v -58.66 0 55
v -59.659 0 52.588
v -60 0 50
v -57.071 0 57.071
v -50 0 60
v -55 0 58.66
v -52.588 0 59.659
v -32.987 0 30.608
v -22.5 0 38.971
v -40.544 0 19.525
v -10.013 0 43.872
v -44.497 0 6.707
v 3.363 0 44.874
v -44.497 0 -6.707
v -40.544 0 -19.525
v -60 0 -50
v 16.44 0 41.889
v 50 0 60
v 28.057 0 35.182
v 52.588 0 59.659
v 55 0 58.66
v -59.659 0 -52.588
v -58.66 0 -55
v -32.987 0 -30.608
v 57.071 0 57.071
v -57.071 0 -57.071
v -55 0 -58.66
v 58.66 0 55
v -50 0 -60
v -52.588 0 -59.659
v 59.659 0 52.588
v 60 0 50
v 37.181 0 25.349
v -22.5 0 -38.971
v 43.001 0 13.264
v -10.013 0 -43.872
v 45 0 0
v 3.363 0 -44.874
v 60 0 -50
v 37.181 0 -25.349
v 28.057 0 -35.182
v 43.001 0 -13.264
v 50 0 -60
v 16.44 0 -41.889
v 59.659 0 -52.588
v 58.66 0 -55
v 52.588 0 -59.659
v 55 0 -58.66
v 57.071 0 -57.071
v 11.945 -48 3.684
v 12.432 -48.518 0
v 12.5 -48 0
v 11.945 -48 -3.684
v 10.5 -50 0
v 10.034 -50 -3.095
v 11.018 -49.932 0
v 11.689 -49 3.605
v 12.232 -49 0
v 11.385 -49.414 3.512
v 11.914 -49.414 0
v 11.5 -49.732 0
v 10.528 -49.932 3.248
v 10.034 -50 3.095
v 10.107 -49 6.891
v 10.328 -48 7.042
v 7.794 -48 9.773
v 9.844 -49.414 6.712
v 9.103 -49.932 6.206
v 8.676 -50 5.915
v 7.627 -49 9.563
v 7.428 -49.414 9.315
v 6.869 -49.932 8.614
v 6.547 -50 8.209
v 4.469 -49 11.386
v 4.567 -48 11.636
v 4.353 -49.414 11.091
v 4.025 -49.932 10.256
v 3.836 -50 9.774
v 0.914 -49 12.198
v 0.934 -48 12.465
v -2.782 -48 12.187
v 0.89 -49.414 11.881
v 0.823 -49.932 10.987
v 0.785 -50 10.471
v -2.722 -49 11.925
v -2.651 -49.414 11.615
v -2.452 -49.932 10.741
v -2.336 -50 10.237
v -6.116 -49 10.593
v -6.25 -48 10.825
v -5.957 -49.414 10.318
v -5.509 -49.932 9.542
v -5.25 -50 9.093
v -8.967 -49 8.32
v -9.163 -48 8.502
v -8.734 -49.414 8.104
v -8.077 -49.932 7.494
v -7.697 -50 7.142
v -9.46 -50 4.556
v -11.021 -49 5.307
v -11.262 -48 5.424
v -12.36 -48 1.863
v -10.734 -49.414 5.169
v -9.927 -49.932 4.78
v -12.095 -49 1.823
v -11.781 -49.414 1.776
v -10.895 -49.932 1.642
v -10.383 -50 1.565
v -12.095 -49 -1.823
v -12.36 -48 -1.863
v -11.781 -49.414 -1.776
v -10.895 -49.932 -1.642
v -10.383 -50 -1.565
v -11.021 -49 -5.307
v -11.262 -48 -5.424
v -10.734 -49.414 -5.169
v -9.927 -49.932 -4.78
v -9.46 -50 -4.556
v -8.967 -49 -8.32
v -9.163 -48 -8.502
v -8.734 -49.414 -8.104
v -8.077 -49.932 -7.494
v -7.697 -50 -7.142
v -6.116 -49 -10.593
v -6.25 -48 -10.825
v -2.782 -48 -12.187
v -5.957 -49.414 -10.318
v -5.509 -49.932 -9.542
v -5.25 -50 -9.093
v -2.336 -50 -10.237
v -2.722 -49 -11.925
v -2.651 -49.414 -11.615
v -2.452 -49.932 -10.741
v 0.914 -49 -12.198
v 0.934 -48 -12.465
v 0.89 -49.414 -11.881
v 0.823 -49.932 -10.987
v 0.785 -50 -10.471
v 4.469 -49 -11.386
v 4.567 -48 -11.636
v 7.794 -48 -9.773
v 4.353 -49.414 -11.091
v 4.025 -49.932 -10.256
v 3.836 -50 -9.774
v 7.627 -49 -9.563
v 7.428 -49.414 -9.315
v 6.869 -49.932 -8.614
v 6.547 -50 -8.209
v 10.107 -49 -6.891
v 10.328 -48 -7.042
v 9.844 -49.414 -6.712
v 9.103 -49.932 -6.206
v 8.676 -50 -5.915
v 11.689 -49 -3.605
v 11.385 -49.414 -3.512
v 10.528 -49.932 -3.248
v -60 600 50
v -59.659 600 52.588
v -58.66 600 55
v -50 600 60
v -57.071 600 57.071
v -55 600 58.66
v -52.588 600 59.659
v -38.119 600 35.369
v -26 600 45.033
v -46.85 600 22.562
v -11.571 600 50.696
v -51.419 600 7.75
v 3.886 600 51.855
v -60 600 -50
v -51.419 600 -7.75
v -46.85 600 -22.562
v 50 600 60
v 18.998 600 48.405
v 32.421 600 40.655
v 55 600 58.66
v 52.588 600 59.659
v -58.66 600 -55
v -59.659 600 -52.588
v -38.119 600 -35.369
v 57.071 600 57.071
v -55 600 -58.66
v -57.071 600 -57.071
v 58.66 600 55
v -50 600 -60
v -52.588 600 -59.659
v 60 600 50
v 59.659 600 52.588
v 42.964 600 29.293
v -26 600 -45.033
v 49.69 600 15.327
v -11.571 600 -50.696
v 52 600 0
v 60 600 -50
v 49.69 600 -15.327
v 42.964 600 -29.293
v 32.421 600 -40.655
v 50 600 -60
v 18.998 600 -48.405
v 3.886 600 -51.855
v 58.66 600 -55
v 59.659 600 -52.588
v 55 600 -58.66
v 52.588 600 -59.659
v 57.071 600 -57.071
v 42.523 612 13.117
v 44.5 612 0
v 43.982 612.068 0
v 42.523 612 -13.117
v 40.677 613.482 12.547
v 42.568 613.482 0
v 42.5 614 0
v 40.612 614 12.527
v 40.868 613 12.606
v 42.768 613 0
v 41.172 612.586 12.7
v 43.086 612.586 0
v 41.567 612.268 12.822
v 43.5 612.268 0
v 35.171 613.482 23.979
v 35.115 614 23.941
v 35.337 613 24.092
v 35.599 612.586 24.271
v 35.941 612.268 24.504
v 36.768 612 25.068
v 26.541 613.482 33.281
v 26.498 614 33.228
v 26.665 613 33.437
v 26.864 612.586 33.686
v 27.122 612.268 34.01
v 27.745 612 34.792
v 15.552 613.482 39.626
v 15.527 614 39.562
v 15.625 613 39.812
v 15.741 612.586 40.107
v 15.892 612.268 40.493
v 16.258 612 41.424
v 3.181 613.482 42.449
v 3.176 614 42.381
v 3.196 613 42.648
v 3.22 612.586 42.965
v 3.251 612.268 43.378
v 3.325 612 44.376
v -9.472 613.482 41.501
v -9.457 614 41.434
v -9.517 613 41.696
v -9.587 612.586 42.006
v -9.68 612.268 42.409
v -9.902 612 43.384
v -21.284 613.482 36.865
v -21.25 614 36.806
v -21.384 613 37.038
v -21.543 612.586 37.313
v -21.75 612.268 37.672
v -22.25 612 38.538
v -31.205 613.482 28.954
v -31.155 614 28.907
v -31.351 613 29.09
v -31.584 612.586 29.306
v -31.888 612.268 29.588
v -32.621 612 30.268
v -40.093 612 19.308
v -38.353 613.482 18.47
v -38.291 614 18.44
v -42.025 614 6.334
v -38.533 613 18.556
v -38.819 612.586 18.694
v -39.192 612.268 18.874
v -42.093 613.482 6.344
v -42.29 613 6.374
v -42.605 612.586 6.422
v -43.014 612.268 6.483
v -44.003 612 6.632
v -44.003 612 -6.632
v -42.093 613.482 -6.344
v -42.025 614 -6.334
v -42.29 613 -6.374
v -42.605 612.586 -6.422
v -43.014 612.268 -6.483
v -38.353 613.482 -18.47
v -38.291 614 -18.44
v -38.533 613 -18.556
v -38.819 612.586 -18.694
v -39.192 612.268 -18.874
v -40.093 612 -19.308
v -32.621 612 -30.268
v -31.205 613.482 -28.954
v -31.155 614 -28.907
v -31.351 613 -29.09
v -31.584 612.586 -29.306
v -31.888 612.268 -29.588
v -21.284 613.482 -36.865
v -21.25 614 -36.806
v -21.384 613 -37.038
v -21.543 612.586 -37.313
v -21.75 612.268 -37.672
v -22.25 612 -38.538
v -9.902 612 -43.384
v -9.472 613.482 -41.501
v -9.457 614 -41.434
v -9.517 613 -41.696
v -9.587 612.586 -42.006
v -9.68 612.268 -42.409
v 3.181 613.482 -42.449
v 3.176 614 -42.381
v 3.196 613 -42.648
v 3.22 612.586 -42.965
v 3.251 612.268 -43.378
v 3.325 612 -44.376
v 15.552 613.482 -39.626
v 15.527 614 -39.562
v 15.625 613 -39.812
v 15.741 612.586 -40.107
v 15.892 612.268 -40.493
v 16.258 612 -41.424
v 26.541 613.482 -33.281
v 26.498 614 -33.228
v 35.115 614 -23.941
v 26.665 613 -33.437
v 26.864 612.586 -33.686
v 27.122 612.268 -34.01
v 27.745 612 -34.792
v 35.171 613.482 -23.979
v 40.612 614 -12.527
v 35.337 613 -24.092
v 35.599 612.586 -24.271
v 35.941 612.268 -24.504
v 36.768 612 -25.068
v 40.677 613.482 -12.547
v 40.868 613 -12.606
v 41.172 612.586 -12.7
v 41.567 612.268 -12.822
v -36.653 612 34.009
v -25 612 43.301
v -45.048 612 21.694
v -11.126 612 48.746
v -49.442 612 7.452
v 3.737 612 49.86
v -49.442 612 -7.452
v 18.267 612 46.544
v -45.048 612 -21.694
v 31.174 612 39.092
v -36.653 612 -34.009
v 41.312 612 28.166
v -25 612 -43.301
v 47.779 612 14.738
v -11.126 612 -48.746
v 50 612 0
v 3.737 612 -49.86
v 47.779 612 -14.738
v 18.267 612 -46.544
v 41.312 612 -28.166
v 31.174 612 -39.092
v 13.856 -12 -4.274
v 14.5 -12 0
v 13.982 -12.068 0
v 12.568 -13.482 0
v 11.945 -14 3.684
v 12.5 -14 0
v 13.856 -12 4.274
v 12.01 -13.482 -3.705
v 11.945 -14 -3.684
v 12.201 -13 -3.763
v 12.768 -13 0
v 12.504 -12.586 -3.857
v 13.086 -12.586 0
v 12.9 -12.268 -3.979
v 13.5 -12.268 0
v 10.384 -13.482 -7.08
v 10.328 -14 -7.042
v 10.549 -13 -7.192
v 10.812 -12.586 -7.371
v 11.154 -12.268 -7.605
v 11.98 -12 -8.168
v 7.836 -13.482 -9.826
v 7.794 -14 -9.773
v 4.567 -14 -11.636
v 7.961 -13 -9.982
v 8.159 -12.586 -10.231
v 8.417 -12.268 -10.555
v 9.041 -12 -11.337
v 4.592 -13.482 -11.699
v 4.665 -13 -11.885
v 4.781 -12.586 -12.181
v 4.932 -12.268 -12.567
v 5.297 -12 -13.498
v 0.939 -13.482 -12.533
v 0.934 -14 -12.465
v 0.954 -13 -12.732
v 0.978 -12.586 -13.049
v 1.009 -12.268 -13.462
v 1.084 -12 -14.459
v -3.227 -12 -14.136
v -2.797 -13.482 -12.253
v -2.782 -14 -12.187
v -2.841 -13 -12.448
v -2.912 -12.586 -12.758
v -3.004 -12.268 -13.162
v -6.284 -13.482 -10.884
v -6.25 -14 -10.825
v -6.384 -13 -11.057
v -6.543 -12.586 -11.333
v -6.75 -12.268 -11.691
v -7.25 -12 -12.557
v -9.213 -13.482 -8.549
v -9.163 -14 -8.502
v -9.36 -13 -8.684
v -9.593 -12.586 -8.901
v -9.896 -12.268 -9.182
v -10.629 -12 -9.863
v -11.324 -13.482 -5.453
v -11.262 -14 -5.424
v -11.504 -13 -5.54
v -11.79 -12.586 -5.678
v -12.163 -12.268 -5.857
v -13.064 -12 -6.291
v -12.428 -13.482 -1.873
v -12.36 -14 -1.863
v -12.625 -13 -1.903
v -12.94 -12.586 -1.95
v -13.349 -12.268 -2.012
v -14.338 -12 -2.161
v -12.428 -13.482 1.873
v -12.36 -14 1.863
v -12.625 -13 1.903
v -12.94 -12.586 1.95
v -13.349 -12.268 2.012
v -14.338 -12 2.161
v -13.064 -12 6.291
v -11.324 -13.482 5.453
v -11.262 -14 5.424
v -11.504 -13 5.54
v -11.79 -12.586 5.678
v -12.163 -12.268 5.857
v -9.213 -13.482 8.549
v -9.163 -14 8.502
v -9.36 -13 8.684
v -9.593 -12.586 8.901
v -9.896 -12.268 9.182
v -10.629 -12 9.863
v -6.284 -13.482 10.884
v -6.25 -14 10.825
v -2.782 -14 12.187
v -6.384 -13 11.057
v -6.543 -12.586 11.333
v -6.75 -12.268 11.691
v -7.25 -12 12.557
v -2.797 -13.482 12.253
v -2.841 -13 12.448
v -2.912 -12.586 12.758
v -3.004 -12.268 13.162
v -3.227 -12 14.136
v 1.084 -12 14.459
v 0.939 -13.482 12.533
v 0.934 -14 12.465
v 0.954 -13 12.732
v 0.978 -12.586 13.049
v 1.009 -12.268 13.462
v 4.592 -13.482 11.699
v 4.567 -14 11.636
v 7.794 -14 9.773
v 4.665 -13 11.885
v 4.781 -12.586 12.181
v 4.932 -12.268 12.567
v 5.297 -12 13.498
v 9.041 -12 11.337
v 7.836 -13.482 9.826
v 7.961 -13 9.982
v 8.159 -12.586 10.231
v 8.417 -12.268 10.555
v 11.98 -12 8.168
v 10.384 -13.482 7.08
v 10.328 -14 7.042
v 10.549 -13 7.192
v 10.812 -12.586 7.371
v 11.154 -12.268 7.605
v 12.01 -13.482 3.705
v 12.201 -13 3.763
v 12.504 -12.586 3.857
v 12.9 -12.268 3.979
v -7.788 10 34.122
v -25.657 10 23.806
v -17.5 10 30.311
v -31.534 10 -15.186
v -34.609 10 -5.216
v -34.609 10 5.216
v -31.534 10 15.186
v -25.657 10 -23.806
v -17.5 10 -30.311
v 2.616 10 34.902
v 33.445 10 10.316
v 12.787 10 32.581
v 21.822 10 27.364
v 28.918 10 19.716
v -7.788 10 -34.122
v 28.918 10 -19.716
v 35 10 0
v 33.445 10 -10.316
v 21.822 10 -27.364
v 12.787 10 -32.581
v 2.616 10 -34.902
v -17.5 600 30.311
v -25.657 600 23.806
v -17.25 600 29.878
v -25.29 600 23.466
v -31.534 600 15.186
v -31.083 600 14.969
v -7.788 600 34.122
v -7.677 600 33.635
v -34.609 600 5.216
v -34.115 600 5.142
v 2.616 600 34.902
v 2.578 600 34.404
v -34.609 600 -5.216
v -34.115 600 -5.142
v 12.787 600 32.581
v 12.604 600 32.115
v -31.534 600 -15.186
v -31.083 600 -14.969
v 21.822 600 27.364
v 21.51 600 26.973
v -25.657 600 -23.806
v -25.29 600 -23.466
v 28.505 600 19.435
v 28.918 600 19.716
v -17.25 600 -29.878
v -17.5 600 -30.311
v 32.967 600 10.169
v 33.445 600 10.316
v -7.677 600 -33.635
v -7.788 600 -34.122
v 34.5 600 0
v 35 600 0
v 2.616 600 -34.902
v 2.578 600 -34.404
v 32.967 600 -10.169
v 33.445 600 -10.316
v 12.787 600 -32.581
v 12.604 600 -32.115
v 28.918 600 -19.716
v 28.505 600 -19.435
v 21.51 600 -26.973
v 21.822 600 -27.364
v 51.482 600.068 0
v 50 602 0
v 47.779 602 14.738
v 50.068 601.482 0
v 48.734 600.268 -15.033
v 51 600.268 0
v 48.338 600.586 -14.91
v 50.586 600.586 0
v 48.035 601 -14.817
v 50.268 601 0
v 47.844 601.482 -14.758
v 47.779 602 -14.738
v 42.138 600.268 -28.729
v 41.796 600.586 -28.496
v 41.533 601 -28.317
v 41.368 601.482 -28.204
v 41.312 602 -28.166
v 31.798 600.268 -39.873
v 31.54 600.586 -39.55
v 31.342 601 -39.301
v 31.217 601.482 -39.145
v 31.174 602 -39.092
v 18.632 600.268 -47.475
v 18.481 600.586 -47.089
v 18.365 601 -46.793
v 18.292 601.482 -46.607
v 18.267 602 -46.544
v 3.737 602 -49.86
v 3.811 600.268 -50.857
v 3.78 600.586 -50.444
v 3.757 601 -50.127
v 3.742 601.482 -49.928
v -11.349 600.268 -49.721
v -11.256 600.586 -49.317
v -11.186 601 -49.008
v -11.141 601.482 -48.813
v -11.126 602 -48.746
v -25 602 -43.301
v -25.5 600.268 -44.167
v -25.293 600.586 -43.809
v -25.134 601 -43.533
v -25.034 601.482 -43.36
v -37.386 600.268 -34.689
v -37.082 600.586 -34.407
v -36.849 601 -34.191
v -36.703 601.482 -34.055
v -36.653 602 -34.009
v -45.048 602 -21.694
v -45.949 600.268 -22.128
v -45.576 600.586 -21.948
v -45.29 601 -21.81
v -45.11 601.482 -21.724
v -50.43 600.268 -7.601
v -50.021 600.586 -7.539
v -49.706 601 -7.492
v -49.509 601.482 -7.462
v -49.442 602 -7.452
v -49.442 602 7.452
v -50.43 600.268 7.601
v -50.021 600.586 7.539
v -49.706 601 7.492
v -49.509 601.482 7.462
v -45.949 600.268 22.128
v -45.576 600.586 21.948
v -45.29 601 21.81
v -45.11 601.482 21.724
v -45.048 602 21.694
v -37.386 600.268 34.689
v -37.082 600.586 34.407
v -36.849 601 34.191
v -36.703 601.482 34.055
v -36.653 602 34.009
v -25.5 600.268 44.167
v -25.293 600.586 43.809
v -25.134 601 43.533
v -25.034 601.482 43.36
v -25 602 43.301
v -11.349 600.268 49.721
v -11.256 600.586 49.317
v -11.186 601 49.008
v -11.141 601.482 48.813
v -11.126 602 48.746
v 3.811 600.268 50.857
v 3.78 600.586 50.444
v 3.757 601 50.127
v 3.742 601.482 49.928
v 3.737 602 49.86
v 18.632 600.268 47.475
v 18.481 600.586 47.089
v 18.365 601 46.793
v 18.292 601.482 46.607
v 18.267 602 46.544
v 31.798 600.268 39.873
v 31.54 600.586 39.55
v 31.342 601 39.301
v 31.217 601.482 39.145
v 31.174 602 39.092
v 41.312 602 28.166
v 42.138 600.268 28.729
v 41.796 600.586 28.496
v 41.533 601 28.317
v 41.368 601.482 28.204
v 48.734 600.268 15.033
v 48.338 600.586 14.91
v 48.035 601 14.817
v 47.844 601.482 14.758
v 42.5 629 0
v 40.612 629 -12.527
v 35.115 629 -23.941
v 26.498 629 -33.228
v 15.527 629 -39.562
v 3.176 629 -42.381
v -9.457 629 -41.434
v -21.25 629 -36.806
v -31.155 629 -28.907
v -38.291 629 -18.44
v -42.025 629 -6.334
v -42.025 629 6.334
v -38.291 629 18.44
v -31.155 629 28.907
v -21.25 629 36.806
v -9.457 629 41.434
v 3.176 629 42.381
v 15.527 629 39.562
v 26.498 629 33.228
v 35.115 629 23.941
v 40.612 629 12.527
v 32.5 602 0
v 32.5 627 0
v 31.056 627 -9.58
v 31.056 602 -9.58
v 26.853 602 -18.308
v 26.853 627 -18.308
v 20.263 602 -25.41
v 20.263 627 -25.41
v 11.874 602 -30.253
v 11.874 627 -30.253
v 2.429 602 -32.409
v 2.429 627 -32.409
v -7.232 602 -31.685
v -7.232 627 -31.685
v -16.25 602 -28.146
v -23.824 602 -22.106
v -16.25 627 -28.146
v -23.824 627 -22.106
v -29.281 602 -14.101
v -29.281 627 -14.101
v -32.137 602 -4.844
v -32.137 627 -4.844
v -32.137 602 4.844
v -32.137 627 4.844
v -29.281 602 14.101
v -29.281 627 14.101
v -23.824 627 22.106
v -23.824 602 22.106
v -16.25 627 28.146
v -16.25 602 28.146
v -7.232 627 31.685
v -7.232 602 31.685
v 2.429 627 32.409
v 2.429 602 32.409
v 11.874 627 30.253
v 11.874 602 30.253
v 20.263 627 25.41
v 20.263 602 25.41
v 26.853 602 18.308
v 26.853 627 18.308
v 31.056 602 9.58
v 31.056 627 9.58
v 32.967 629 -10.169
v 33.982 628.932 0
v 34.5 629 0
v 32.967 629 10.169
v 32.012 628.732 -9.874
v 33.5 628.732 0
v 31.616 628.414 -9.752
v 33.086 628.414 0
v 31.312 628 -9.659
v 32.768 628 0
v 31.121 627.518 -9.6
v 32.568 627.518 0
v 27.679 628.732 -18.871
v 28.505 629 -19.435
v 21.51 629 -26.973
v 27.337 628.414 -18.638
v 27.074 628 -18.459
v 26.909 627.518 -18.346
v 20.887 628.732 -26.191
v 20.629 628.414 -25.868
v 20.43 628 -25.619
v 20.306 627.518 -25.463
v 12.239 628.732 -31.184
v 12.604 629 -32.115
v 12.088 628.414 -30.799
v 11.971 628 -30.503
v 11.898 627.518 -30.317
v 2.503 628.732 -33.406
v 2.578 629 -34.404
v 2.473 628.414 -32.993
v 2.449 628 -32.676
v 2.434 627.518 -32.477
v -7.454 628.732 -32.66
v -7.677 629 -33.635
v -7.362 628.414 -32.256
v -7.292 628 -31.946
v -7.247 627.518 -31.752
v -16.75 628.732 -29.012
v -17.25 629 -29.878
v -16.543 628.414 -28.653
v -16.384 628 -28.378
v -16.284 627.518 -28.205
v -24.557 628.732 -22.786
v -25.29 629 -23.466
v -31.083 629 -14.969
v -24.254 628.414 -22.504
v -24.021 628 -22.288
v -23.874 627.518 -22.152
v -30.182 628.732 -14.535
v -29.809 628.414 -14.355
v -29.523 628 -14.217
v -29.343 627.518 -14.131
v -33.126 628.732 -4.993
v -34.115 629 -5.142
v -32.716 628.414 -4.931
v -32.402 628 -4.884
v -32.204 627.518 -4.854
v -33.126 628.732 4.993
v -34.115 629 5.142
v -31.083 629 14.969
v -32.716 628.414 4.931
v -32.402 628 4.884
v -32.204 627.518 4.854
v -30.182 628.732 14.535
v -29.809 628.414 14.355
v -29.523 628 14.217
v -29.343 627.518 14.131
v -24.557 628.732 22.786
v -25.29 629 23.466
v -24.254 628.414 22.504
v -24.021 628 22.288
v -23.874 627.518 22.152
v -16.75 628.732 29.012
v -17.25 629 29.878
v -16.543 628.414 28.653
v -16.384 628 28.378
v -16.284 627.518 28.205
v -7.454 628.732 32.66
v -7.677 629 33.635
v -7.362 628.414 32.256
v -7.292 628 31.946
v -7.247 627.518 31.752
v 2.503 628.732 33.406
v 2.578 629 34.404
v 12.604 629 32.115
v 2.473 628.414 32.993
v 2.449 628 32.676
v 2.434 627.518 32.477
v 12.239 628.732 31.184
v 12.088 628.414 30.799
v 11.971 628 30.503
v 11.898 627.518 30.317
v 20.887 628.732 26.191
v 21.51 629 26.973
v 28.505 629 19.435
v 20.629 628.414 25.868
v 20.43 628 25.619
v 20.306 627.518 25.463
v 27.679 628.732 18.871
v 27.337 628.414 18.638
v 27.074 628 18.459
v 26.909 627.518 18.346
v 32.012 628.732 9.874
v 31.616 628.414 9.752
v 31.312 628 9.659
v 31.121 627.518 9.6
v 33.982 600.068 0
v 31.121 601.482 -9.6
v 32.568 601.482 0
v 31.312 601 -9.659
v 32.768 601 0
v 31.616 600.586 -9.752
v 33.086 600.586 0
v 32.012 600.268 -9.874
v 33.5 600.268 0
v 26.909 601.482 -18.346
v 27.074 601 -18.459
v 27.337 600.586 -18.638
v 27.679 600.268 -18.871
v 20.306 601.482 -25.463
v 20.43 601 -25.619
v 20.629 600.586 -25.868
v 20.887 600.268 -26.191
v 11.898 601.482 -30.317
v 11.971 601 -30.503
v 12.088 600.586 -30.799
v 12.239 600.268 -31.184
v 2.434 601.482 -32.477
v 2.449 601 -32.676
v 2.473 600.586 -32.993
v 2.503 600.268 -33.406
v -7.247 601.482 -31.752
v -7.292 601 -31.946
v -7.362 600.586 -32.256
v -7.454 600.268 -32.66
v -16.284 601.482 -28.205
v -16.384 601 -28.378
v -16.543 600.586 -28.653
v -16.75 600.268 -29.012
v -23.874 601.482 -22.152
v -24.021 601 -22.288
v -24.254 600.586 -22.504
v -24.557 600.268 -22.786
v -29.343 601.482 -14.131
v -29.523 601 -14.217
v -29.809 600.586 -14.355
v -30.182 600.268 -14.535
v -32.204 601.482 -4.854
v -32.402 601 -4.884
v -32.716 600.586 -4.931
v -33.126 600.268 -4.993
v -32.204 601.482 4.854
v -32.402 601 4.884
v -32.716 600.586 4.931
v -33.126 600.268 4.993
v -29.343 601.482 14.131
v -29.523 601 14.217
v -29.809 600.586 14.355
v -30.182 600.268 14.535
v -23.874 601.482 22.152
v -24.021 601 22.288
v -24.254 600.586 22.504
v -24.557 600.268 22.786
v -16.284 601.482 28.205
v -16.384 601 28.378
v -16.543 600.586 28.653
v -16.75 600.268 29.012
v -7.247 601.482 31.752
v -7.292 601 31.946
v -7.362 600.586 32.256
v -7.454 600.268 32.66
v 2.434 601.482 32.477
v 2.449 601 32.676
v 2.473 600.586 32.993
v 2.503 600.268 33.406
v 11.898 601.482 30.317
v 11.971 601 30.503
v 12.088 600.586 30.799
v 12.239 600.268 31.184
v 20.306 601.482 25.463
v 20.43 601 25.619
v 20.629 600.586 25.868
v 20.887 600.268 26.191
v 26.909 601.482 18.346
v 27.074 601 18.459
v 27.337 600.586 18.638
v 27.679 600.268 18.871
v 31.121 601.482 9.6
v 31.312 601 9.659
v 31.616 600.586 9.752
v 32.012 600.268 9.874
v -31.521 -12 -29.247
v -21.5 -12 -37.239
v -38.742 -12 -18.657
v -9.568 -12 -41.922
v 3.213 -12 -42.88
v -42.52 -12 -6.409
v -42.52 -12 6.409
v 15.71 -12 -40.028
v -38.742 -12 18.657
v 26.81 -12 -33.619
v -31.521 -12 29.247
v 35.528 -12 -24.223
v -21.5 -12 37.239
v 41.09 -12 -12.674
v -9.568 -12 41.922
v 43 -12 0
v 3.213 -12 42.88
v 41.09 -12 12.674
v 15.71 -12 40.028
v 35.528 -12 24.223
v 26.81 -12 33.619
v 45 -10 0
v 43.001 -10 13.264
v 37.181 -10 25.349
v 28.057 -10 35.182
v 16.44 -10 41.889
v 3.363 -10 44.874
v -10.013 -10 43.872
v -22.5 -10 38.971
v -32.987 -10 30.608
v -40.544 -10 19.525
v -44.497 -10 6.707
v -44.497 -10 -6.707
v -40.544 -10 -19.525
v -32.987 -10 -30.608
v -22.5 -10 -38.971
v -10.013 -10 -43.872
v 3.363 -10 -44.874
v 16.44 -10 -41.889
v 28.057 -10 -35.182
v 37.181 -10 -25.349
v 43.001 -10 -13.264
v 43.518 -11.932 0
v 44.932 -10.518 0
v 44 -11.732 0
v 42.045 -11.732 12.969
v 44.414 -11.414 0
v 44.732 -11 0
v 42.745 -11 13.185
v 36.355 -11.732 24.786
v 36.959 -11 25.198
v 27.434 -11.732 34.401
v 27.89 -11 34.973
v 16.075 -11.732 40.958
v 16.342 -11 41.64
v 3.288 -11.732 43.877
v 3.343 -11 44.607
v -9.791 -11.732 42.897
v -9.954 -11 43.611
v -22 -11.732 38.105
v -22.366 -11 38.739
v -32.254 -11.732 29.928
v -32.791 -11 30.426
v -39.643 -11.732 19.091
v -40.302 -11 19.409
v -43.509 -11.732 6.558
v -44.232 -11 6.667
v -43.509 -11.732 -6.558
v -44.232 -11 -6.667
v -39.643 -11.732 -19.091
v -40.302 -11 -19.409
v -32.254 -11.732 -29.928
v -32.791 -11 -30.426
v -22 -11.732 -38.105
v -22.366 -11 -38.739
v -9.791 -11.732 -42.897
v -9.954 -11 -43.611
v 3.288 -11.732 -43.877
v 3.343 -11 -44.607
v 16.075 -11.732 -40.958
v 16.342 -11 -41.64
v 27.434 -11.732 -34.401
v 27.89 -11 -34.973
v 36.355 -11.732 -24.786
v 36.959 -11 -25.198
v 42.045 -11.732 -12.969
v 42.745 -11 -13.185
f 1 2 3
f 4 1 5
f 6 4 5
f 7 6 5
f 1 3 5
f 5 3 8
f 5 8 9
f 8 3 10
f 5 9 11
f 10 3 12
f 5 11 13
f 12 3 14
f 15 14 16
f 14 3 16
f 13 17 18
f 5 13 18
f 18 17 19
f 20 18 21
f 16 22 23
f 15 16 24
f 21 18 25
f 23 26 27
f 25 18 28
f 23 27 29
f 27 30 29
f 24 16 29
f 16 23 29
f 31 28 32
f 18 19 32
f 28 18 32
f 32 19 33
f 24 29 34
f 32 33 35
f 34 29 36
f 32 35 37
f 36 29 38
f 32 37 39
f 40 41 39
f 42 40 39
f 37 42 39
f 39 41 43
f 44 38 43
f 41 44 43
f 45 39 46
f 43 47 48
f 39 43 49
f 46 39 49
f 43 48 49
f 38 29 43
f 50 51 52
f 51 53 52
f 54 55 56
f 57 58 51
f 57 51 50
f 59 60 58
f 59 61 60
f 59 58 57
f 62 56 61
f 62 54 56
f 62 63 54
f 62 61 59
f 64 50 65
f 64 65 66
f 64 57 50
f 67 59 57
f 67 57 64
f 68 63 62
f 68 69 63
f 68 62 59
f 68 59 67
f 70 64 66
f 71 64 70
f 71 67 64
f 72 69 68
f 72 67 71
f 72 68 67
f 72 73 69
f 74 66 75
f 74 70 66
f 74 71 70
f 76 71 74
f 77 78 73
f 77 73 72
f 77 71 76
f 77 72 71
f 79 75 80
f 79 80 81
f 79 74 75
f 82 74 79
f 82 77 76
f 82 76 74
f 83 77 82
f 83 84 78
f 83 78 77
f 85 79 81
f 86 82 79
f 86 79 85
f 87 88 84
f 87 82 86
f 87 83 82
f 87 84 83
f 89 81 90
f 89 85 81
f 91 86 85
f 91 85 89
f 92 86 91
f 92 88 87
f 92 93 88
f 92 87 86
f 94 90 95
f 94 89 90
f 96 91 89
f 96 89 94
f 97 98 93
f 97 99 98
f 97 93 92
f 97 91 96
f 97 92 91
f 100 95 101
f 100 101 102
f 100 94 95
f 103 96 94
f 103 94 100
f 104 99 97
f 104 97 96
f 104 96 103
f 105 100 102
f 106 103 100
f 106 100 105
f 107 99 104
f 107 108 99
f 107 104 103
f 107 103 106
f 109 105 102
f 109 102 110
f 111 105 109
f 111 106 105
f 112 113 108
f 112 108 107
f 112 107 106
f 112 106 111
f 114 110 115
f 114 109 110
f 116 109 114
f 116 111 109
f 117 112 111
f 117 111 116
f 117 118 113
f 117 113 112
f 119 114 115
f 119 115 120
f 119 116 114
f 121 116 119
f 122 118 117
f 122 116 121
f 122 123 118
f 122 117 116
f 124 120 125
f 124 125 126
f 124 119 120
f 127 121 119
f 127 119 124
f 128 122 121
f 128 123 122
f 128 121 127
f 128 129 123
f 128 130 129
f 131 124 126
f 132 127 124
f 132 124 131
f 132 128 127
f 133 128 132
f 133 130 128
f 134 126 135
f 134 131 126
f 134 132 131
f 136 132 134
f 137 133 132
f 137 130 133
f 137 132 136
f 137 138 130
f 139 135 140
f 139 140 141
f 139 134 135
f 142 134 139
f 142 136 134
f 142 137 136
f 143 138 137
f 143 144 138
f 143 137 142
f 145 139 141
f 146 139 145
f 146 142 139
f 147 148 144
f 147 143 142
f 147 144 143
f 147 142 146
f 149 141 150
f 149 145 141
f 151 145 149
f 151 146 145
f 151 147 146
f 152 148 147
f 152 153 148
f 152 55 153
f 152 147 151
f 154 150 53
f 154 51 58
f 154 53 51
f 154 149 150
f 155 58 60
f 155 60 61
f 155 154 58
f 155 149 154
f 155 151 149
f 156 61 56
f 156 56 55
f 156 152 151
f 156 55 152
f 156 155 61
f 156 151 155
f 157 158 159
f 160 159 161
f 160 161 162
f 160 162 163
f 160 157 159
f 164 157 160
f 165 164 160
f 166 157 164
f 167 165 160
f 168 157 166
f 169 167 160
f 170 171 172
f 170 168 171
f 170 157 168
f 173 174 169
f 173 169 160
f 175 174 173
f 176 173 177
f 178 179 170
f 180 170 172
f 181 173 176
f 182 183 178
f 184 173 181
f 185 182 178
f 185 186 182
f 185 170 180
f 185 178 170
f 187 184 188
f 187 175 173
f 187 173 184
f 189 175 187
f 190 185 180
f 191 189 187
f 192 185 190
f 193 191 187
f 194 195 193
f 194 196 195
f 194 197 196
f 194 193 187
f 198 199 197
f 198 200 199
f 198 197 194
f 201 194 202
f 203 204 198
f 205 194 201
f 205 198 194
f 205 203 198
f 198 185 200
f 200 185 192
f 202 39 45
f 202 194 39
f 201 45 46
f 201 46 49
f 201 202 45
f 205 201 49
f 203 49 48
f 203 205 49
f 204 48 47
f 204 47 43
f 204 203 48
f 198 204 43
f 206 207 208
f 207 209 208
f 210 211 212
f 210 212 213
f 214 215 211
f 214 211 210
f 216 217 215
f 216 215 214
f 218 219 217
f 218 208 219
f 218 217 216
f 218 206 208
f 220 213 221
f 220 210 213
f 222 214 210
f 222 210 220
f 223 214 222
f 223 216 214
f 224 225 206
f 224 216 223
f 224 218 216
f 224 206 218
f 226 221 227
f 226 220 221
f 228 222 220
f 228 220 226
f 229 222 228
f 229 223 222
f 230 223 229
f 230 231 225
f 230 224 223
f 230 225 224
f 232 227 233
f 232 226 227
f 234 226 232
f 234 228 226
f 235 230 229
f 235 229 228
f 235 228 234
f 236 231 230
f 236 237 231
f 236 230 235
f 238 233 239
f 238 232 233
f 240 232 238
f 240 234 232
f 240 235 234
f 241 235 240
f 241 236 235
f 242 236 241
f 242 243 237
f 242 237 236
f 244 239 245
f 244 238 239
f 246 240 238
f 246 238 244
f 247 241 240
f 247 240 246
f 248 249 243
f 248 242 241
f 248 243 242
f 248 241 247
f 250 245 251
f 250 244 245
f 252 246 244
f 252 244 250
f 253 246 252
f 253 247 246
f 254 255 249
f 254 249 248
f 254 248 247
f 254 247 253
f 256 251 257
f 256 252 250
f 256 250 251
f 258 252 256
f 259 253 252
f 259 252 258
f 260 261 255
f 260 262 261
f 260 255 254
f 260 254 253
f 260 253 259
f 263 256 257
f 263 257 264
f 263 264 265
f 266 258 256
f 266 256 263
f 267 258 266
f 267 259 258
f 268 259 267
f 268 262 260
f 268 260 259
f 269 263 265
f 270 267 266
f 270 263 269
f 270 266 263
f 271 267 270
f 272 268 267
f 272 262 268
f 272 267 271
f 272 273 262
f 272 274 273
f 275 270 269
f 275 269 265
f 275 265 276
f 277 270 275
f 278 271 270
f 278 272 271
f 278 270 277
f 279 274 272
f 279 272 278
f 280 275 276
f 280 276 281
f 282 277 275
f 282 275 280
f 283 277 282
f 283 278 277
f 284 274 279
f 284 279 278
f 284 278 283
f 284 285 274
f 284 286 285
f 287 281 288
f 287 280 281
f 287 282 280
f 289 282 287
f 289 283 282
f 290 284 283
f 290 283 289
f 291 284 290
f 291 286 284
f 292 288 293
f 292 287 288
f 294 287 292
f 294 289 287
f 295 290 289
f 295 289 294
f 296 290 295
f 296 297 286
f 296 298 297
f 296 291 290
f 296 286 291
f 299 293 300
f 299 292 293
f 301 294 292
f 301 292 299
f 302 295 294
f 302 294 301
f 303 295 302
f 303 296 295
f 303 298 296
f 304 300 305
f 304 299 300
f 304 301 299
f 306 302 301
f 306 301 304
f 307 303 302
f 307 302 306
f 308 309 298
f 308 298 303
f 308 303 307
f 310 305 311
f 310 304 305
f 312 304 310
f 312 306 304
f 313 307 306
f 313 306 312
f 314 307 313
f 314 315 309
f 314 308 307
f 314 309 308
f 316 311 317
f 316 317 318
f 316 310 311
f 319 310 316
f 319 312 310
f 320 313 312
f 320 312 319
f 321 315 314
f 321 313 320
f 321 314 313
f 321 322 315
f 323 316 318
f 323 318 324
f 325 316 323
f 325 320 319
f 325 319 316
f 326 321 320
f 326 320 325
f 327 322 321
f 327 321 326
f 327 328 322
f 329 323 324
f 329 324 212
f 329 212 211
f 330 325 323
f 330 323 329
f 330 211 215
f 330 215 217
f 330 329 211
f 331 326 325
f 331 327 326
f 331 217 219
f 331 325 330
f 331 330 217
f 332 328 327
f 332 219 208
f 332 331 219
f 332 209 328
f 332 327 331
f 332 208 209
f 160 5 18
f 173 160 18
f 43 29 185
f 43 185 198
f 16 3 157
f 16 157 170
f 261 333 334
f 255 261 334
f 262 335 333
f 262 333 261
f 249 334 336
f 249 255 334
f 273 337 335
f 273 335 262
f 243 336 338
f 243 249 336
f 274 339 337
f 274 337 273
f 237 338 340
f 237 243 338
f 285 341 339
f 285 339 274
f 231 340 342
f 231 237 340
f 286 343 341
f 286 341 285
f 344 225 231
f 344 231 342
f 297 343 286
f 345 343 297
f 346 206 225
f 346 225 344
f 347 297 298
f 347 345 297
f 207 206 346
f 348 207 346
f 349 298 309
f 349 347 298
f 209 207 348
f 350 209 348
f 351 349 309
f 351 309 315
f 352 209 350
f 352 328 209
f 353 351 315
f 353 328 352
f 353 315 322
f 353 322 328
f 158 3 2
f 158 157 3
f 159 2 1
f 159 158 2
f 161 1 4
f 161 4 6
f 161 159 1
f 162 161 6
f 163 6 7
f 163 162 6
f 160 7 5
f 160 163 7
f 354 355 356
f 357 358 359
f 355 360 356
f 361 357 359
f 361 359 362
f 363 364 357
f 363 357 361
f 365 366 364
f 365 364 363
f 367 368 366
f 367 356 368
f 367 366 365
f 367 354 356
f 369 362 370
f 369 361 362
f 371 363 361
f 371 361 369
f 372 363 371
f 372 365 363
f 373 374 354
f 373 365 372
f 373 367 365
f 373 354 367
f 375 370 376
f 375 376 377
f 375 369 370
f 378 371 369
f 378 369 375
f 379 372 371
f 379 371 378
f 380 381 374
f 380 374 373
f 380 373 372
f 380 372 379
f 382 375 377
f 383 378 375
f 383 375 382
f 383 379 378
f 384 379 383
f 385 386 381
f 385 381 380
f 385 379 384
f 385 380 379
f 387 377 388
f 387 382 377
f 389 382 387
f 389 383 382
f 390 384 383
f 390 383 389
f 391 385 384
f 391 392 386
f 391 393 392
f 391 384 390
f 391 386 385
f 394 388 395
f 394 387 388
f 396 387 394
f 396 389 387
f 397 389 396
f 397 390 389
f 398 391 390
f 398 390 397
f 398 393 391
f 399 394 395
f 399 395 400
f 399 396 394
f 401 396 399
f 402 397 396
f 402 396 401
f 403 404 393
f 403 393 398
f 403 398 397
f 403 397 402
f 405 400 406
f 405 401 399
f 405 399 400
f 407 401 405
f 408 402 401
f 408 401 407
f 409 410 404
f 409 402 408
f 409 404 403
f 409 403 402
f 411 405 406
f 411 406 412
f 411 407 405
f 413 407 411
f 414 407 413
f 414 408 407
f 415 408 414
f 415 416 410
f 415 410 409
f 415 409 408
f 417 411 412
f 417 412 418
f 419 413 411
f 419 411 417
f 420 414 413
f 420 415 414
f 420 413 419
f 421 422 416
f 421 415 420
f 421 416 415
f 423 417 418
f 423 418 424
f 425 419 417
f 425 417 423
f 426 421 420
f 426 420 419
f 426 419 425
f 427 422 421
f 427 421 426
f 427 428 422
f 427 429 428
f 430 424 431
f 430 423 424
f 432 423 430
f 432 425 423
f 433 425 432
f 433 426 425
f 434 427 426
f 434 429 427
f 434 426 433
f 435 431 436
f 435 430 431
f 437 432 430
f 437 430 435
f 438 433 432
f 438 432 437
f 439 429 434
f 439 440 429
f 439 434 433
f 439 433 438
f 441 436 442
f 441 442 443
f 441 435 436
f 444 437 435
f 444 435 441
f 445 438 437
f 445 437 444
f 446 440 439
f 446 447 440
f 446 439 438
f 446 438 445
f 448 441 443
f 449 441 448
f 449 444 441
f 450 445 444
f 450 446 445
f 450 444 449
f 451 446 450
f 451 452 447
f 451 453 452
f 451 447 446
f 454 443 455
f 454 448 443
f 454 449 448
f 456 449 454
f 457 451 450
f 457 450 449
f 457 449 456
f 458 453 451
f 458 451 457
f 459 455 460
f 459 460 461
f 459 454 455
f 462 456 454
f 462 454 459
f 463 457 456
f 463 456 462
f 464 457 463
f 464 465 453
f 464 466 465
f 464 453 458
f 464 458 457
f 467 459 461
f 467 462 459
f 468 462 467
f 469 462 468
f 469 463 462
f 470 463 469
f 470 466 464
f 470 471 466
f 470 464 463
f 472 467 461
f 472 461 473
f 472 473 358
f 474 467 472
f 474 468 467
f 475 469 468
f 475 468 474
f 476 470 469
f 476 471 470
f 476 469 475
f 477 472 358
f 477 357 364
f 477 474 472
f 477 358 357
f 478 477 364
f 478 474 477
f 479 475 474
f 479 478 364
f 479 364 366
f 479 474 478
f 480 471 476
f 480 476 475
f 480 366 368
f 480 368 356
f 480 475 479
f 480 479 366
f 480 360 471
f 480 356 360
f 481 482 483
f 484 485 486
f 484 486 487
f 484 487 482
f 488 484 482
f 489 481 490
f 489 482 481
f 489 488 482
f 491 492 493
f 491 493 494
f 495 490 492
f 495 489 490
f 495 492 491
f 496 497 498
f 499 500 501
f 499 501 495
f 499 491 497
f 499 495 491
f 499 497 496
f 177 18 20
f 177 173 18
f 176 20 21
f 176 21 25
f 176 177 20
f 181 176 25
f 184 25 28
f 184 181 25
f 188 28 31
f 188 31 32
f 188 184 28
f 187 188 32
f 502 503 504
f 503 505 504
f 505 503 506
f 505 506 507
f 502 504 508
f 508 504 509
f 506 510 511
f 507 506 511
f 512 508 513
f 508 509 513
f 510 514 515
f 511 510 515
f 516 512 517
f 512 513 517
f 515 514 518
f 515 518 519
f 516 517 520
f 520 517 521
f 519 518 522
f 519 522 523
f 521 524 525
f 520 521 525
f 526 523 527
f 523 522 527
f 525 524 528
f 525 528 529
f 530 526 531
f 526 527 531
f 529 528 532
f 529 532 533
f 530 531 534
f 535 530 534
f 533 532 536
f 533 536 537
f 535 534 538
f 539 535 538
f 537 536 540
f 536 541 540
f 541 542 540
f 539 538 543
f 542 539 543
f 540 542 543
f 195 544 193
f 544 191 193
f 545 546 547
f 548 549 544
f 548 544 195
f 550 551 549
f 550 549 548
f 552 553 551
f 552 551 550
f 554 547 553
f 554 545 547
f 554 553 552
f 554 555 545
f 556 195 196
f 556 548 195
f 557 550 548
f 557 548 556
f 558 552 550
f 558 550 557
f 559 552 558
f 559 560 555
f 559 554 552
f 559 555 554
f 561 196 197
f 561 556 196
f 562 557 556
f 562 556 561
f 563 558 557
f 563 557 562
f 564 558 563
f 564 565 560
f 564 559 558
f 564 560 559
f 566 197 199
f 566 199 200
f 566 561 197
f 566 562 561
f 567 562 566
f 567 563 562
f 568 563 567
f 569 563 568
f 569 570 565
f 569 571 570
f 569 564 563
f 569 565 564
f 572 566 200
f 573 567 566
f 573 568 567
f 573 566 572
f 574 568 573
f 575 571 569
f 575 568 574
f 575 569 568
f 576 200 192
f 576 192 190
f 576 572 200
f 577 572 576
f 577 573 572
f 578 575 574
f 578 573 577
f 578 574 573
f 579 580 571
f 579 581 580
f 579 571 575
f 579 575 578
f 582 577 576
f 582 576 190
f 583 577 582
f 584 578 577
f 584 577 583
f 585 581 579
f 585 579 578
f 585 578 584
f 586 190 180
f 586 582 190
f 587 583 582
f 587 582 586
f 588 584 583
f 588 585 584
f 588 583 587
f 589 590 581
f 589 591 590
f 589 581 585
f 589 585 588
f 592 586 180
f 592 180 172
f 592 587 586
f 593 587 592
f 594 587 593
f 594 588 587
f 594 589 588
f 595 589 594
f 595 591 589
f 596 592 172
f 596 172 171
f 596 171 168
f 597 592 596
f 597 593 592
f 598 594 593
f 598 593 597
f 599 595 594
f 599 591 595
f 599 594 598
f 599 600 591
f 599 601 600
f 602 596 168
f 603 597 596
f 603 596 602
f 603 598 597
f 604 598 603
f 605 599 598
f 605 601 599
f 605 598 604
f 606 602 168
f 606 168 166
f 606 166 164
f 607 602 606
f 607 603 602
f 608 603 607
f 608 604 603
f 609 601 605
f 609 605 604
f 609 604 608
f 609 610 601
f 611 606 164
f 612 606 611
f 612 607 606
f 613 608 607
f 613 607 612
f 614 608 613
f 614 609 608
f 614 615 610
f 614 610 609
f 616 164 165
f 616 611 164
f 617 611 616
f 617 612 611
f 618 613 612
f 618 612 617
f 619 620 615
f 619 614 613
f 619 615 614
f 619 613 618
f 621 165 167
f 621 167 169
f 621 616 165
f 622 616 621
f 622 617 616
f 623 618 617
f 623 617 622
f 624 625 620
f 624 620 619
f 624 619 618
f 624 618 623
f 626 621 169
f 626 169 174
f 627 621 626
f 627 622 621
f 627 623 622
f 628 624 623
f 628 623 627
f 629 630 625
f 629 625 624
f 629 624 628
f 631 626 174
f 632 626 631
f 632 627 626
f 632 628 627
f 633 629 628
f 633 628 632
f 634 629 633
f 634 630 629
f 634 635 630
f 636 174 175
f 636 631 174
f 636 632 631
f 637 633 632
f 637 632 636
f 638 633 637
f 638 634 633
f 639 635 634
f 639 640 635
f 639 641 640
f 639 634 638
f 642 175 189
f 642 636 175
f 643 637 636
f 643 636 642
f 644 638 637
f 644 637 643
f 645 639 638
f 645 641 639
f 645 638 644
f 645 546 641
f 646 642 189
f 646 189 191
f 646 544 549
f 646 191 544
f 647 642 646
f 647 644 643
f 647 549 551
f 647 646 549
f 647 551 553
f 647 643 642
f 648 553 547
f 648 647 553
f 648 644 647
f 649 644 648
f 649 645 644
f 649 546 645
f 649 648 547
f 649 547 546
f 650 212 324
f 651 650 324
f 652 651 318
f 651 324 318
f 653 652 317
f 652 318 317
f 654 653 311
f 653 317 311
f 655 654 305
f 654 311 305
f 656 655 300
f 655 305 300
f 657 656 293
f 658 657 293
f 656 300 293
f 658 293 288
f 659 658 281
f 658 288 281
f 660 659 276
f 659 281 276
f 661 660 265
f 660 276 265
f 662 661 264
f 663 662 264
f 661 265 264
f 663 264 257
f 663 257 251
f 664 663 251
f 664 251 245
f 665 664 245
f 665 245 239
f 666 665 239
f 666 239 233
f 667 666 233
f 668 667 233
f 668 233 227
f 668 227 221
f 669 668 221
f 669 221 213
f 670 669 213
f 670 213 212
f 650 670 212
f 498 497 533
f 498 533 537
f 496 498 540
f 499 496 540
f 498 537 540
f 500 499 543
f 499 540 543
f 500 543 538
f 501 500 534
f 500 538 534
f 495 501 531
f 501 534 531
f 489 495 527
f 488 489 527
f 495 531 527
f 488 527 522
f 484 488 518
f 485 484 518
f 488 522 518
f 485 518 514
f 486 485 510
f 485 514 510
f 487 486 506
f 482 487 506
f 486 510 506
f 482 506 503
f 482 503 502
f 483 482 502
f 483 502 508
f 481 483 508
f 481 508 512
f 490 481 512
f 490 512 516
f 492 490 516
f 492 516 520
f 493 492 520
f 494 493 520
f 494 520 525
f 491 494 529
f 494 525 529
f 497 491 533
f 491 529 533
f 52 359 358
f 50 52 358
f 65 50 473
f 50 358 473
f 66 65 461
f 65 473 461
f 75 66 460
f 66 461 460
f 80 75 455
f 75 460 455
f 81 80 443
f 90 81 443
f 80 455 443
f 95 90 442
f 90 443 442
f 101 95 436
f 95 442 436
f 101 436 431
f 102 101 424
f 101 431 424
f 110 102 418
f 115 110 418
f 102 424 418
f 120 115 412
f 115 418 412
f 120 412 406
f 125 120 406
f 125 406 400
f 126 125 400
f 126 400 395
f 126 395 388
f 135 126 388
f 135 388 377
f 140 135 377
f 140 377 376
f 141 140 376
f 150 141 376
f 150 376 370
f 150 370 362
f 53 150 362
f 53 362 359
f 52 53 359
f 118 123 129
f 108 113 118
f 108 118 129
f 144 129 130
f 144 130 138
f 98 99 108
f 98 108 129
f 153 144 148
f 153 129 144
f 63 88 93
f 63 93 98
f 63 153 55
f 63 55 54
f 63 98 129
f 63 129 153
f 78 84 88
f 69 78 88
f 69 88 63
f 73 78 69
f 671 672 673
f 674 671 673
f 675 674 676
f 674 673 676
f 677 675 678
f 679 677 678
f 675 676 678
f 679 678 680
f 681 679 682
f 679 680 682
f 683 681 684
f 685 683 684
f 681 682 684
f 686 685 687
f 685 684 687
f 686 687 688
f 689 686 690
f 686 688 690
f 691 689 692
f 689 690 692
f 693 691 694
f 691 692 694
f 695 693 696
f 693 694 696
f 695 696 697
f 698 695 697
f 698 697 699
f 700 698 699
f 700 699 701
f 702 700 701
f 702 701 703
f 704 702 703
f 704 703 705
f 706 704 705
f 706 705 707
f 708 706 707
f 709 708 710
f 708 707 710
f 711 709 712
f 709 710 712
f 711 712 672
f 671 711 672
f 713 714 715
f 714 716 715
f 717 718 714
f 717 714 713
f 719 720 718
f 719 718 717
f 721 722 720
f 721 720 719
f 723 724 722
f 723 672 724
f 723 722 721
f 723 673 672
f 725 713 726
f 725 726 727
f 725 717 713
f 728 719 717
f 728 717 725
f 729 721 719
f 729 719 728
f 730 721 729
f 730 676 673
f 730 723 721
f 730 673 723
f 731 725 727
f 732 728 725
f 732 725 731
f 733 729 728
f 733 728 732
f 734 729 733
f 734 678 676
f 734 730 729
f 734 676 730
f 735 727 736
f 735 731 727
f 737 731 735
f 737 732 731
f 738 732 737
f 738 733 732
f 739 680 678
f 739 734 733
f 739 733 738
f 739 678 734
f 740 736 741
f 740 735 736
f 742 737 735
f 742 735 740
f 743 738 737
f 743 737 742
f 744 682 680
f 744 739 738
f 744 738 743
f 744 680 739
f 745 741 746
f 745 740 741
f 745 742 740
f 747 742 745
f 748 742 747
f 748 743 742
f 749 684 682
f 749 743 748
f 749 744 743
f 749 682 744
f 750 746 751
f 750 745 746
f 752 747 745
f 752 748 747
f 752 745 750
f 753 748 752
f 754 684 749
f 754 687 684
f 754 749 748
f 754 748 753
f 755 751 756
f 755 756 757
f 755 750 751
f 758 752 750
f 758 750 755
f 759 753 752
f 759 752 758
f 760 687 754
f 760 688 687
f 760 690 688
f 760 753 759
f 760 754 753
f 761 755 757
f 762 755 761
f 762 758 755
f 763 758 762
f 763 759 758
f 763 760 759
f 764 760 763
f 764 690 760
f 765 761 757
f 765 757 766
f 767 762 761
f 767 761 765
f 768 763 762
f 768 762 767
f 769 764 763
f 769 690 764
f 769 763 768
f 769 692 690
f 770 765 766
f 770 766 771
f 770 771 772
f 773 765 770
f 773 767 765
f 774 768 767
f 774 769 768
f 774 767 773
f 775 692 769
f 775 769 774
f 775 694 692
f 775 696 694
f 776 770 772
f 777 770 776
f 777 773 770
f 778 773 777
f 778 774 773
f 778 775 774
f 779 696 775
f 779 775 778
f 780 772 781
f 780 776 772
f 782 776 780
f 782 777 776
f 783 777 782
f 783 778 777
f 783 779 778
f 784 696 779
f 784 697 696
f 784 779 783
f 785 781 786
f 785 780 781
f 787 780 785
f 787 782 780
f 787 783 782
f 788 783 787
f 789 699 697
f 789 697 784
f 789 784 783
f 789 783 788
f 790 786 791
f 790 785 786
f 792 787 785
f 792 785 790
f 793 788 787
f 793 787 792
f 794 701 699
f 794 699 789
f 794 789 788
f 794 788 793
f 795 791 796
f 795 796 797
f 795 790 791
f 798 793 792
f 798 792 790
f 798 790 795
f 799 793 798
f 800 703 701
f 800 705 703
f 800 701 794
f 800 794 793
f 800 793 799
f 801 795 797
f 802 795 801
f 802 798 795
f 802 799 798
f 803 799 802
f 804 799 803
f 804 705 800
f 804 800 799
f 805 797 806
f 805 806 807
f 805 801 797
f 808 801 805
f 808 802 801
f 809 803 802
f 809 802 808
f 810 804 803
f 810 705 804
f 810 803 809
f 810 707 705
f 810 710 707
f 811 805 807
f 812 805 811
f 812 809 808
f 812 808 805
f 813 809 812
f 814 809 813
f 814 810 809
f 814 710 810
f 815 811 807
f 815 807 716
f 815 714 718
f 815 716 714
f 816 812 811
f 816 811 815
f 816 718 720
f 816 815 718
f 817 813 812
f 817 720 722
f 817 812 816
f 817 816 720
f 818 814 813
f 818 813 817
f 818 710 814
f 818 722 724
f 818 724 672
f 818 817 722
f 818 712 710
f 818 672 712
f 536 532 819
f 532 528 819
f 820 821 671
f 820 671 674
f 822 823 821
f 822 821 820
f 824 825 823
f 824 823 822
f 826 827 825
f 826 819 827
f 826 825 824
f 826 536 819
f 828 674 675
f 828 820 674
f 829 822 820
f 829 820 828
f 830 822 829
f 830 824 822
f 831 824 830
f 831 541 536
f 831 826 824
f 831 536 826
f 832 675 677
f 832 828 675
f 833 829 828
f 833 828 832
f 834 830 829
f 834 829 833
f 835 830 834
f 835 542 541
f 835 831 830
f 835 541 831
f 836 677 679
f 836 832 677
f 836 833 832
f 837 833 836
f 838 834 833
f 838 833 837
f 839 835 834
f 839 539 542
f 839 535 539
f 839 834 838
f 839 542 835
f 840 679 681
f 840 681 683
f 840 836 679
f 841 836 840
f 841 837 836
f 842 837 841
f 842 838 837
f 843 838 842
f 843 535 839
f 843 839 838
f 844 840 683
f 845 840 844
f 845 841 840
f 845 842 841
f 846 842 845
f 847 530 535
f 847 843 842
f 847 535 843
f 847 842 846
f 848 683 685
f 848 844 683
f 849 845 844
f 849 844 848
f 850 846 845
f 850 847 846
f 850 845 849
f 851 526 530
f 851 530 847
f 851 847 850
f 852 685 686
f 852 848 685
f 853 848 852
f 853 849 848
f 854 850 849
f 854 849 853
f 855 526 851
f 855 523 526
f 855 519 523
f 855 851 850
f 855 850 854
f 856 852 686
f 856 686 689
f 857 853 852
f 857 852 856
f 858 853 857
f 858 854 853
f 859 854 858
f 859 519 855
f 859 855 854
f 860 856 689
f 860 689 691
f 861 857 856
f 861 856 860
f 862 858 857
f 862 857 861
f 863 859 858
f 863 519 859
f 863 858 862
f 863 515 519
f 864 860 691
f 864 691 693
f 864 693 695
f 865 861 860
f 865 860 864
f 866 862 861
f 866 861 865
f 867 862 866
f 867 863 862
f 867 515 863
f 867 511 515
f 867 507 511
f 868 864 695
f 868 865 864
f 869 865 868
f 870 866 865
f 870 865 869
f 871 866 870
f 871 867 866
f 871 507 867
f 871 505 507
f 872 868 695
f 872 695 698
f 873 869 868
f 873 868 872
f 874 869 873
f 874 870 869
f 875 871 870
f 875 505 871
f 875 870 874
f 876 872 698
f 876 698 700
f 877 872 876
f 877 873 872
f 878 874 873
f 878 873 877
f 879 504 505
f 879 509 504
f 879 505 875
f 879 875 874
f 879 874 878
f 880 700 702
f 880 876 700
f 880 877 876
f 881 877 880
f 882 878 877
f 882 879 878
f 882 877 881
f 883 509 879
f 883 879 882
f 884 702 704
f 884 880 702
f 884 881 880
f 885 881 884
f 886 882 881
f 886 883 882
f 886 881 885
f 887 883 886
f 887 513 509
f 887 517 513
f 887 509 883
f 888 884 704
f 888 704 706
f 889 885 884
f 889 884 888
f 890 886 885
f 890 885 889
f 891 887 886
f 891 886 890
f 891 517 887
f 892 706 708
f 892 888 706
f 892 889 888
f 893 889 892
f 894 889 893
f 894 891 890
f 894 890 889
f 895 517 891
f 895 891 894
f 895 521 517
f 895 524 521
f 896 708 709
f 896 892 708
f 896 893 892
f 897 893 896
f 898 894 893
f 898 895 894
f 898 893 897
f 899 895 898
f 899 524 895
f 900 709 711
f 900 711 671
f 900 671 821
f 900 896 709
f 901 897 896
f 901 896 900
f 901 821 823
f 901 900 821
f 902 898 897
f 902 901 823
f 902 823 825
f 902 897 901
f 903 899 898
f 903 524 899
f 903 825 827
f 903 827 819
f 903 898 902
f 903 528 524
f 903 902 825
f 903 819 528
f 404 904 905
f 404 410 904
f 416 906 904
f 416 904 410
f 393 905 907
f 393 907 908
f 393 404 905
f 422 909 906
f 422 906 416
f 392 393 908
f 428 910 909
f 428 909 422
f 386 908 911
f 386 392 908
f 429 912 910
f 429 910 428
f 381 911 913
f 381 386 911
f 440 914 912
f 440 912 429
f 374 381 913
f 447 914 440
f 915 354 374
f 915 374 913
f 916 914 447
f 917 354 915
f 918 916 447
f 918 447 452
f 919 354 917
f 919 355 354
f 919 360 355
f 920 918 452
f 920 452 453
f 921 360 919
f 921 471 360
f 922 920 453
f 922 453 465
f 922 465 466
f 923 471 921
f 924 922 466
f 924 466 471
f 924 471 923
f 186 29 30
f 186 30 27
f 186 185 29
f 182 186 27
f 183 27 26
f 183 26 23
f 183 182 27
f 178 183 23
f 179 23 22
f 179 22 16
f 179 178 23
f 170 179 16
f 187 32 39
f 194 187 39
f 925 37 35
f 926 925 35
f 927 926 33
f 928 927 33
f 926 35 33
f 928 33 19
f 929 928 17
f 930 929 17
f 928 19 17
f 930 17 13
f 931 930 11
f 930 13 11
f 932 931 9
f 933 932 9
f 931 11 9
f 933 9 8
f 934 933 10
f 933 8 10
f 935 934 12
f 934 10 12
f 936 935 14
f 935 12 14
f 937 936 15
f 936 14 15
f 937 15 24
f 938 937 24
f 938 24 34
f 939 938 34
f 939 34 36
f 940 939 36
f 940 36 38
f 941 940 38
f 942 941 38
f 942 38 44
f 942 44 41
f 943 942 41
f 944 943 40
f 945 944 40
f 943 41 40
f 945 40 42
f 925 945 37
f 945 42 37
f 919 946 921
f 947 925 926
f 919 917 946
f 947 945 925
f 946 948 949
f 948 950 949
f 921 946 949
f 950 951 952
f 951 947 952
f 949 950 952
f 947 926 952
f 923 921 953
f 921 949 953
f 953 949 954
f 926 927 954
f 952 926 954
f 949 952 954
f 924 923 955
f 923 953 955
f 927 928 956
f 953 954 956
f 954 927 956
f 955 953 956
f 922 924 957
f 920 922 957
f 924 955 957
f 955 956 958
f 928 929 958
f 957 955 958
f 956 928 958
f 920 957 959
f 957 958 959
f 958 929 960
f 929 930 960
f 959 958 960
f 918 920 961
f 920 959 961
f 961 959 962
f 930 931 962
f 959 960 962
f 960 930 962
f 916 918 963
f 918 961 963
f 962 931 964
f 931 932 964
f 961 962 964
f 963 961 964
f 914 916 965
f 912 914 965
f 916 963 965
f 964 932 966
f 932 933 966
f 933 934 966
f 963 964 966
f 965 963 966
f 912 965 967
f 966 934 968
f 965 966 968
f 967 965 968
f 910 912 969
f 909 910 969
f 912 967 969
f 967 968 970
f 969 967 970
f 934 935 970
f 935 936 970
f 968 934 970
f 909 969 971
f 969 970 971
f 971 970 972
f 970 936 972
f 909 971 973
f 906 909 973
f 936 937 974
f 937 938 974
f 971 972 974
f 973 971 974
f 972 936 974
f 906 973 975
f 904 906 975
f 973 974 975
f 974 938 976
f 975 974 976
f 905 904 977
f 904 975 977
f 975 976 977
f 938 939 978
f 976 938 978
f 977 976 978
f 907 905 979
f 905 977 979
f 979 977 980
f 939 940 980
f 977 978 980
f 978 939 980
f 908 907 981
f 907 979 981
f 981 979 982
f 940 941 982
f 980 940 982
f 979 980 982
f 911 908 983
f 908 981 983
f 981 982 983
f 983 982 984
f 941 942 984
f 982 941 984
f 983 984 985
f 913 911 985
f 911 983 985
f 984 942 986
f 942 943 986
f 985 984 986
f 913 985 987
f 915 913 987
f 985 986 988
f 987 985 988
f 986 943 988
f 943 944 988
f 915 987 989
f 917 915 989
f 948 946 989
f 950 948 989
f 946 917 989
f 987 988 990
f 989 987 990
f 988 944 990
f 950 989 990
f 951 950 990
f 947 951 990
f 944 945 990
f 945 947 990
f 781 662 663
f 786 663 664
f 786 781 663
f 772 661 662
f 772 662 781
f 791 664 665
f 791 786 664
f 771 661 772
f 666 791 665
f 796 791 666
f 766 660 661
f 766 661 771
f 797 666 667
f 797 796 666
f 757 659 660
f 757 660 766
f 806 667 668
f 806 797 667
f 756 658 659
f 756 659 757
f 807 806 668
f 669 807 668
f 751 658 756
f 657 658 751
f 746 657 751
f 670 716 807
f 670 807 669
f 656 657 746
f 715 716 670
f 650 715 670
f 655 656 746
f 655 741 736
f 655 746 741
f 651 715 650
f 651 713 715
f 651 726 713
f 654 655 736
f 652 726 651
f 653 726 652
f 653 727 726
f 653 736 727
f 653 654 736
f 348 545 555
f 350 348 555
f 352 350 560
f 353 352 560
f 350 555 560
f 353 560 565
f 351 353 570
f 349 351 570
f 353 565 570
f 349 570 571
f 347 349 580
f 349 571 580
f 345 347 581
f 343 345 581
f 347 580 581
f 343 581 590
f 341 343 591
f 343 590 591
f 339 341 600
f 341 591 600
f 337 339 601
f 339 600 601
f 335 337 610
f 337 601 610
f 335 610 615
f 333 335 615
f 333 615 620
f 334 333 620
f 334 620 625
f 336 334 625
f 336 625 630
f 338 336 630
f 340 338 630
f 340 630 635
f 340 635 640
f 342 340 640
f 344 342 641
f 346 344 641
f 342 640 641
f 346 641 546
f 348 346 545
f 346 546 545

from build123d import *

# Parameters (mm, degrees)
ESQUISSE1_W             = 120
ESQUISSE1_H             = 120
BOSS_EXTRU_1_DEPTH      = 600
CONG_1_R                = 10
CONG_2_R                = 10
CONG_3_R                = 10
CONG_4_R                = 10
ESQUISSE2_R             = 42.5
BOSS_EXTRU_2_DEPTH      = 29
ESQUISSE4_R             = 50
BOSS_EXTRU_3_DEPTH      = 12
ESQUISSE8_R             = 45
BOSS_EXTRU_4_DEPTH      = 12
ESQUISSE9_R             = 12.5
BOSS_EXTRU_5_DEPTH      = 50
ESQUISSE5_R             = 35
ENL_V_MAT_EXTRU_1_DEPTH = 590
CONG_5_R                = 2
CONG_6_R                = 2
CONG_7_R                = 2
ESQUISSE11_R            = 32.5
ENL_V_MAT_EXTRU_3_DEPTH = 29
CONG_9_R                = 2
CONG_11_R               = 2
CONG_12_R               = 2


with BuildPart() as part:
    # Esquisse1 → Boss.-Extru.1 (new body)
    with BuildSketch(Plane(origin=(0, 0, 0), x_dir=(1, 0, 0), z_dir=(0, 1, 0))):
        Rectangle(ESQUISSE1_W, ESQUISSE1_H)
    extrude(amount=BOSS_EXTRU_1_DEPTH)

    # Congé1
    cong_1_edges = [part.edges().sort_by_distance(p)[0] for p in [
        (60, 300, 60),
    ]]
    fillet(cong_1_edges, radius=CONG_1_R)

    # Congé2
    cong_2_edges = [part.edges().sort_by_distance(p)[0] for p in [
        (60, 300, -60),
    ]]
    fillet(cong_2_edges, radius=CONG_2_R)

    # Congé3
    cong_3_edges = [part.edges().sort_by_distance(p)[0] for p in [
        (-60, 300, -60),
    ]]
    fillet(cong_3_edges, radius=CONG_3_R)

    # Congé4
    cong_4_edges = [part.edges().sort_by_distance(p)[0] for p in [
        (-60, 300, 60),
    ]]
    fillet(cong_4_edges, radius=CONG_4_R)

    # Esquisse2 → Boss.-Extru.2 (add)
    with BuildSketch(Plane(origin=(0, 600, 0), x_dir=(1, 0, 0), z_dir=(0, 1, 0))):
        Circle(ESQUISSE2_R)
    extrude(amount=BOSS_EXTRU_2_DEPTH)

    # Esquisse4 → Boss.-Extru.3 (add)
    with BuildSketch(Plane(origin=(0, 600, 0), x_dir=(1, 0, 0), z_dir=(0, 1, 0))):
        Circle(ESQUISSE4_R)
    extrude(amount=BOSS_EXTRU_3_DEPTH)

    # Esquisse8 → Boss.-Extru.4 (add)
    with BuildSketch(Plane.XZ):
        Circle(ESQUISSE8_R)
    extrude(amount=BOSS_EXTRU_4_DEPTH)

    # Esquisse9 → Boss.-Extru.5 (add)
    with BuildSketch(Plane.XZ):
        Circle(ESQUISSE9_R)
    extrude(amount=BOSS_EXTRU_5_DEPTH)

    # Esquisse5 → Enlèv. mat.-Extru.1 (cut)
    with BuildSketch(Plane(origin=(0, 600, 0), x_dir=(1, 0, 0), z_dir=(0, 1, 0))):
        Circle(ESQUISSE5_R)
    extrude(amount=-ENL_V_MAT_EXTRU_1_DEPTH, mode=Mode.SUBTRACT)

    # Congé5
    cong_5_edges = [part.edges().sort_by_distance(p)[0] for p in [
        (-45, -12, 0),
        (-12.5, -12, 0),
    ]]
    fillet(cong_5_edges, radius=CONG_5_R)

    # Congé6
    cong_6_edges = [part.edges().sort_by_distance(p)[0] for p in [
        (-12.5, -50, 0),
    ]]
    fillet(cong_6_edges, radius=CONG_6_R)

    # Congé7
    cong_7_edges = [part.edges().sort_by_distance(p)[0] for p in [
        (-50, 600, 0),
    ]]
    fillet(cong_7_edges, radius=CONG_7_R)

    # Esquisse11 → Enlèv. mat.-Extru.3 (cut)
    with BuildSketch(Plane(origin=(0, 629, 0), x_dir=(1, 0, 0), z_dir=(0, 1, 0))):
        Circle(ESQUISSE11_R)
    extrude(amount=-ENL_V_MAT_EXTRU_3_DEPTH, mode=Mode.SUBTRACT)

    # Congé9
    cong_9_edges = [part.edges().sort_by_distance(p)[0] for p in [
        (-32.5, 600, 0),
    ]]
    fillet(cong_9_edges, radius=CONG_9_R)

    # Congé11
    cong_11_edges = [part.edges().sort_by_distance(p)[0] for p in [
        (-42.5, 612, 0),
    ]]
    fillet(cong_11_edges, radius=CONG_11_R)

    # Congé12
    cong_12_edges = [part.edges().sort_by_distance(p)[0] for p in [
        (-32.5, 629, 0),
    ]]
    fillet(cong_12_edges, radius=CONG_12_R)


solid = part.part
